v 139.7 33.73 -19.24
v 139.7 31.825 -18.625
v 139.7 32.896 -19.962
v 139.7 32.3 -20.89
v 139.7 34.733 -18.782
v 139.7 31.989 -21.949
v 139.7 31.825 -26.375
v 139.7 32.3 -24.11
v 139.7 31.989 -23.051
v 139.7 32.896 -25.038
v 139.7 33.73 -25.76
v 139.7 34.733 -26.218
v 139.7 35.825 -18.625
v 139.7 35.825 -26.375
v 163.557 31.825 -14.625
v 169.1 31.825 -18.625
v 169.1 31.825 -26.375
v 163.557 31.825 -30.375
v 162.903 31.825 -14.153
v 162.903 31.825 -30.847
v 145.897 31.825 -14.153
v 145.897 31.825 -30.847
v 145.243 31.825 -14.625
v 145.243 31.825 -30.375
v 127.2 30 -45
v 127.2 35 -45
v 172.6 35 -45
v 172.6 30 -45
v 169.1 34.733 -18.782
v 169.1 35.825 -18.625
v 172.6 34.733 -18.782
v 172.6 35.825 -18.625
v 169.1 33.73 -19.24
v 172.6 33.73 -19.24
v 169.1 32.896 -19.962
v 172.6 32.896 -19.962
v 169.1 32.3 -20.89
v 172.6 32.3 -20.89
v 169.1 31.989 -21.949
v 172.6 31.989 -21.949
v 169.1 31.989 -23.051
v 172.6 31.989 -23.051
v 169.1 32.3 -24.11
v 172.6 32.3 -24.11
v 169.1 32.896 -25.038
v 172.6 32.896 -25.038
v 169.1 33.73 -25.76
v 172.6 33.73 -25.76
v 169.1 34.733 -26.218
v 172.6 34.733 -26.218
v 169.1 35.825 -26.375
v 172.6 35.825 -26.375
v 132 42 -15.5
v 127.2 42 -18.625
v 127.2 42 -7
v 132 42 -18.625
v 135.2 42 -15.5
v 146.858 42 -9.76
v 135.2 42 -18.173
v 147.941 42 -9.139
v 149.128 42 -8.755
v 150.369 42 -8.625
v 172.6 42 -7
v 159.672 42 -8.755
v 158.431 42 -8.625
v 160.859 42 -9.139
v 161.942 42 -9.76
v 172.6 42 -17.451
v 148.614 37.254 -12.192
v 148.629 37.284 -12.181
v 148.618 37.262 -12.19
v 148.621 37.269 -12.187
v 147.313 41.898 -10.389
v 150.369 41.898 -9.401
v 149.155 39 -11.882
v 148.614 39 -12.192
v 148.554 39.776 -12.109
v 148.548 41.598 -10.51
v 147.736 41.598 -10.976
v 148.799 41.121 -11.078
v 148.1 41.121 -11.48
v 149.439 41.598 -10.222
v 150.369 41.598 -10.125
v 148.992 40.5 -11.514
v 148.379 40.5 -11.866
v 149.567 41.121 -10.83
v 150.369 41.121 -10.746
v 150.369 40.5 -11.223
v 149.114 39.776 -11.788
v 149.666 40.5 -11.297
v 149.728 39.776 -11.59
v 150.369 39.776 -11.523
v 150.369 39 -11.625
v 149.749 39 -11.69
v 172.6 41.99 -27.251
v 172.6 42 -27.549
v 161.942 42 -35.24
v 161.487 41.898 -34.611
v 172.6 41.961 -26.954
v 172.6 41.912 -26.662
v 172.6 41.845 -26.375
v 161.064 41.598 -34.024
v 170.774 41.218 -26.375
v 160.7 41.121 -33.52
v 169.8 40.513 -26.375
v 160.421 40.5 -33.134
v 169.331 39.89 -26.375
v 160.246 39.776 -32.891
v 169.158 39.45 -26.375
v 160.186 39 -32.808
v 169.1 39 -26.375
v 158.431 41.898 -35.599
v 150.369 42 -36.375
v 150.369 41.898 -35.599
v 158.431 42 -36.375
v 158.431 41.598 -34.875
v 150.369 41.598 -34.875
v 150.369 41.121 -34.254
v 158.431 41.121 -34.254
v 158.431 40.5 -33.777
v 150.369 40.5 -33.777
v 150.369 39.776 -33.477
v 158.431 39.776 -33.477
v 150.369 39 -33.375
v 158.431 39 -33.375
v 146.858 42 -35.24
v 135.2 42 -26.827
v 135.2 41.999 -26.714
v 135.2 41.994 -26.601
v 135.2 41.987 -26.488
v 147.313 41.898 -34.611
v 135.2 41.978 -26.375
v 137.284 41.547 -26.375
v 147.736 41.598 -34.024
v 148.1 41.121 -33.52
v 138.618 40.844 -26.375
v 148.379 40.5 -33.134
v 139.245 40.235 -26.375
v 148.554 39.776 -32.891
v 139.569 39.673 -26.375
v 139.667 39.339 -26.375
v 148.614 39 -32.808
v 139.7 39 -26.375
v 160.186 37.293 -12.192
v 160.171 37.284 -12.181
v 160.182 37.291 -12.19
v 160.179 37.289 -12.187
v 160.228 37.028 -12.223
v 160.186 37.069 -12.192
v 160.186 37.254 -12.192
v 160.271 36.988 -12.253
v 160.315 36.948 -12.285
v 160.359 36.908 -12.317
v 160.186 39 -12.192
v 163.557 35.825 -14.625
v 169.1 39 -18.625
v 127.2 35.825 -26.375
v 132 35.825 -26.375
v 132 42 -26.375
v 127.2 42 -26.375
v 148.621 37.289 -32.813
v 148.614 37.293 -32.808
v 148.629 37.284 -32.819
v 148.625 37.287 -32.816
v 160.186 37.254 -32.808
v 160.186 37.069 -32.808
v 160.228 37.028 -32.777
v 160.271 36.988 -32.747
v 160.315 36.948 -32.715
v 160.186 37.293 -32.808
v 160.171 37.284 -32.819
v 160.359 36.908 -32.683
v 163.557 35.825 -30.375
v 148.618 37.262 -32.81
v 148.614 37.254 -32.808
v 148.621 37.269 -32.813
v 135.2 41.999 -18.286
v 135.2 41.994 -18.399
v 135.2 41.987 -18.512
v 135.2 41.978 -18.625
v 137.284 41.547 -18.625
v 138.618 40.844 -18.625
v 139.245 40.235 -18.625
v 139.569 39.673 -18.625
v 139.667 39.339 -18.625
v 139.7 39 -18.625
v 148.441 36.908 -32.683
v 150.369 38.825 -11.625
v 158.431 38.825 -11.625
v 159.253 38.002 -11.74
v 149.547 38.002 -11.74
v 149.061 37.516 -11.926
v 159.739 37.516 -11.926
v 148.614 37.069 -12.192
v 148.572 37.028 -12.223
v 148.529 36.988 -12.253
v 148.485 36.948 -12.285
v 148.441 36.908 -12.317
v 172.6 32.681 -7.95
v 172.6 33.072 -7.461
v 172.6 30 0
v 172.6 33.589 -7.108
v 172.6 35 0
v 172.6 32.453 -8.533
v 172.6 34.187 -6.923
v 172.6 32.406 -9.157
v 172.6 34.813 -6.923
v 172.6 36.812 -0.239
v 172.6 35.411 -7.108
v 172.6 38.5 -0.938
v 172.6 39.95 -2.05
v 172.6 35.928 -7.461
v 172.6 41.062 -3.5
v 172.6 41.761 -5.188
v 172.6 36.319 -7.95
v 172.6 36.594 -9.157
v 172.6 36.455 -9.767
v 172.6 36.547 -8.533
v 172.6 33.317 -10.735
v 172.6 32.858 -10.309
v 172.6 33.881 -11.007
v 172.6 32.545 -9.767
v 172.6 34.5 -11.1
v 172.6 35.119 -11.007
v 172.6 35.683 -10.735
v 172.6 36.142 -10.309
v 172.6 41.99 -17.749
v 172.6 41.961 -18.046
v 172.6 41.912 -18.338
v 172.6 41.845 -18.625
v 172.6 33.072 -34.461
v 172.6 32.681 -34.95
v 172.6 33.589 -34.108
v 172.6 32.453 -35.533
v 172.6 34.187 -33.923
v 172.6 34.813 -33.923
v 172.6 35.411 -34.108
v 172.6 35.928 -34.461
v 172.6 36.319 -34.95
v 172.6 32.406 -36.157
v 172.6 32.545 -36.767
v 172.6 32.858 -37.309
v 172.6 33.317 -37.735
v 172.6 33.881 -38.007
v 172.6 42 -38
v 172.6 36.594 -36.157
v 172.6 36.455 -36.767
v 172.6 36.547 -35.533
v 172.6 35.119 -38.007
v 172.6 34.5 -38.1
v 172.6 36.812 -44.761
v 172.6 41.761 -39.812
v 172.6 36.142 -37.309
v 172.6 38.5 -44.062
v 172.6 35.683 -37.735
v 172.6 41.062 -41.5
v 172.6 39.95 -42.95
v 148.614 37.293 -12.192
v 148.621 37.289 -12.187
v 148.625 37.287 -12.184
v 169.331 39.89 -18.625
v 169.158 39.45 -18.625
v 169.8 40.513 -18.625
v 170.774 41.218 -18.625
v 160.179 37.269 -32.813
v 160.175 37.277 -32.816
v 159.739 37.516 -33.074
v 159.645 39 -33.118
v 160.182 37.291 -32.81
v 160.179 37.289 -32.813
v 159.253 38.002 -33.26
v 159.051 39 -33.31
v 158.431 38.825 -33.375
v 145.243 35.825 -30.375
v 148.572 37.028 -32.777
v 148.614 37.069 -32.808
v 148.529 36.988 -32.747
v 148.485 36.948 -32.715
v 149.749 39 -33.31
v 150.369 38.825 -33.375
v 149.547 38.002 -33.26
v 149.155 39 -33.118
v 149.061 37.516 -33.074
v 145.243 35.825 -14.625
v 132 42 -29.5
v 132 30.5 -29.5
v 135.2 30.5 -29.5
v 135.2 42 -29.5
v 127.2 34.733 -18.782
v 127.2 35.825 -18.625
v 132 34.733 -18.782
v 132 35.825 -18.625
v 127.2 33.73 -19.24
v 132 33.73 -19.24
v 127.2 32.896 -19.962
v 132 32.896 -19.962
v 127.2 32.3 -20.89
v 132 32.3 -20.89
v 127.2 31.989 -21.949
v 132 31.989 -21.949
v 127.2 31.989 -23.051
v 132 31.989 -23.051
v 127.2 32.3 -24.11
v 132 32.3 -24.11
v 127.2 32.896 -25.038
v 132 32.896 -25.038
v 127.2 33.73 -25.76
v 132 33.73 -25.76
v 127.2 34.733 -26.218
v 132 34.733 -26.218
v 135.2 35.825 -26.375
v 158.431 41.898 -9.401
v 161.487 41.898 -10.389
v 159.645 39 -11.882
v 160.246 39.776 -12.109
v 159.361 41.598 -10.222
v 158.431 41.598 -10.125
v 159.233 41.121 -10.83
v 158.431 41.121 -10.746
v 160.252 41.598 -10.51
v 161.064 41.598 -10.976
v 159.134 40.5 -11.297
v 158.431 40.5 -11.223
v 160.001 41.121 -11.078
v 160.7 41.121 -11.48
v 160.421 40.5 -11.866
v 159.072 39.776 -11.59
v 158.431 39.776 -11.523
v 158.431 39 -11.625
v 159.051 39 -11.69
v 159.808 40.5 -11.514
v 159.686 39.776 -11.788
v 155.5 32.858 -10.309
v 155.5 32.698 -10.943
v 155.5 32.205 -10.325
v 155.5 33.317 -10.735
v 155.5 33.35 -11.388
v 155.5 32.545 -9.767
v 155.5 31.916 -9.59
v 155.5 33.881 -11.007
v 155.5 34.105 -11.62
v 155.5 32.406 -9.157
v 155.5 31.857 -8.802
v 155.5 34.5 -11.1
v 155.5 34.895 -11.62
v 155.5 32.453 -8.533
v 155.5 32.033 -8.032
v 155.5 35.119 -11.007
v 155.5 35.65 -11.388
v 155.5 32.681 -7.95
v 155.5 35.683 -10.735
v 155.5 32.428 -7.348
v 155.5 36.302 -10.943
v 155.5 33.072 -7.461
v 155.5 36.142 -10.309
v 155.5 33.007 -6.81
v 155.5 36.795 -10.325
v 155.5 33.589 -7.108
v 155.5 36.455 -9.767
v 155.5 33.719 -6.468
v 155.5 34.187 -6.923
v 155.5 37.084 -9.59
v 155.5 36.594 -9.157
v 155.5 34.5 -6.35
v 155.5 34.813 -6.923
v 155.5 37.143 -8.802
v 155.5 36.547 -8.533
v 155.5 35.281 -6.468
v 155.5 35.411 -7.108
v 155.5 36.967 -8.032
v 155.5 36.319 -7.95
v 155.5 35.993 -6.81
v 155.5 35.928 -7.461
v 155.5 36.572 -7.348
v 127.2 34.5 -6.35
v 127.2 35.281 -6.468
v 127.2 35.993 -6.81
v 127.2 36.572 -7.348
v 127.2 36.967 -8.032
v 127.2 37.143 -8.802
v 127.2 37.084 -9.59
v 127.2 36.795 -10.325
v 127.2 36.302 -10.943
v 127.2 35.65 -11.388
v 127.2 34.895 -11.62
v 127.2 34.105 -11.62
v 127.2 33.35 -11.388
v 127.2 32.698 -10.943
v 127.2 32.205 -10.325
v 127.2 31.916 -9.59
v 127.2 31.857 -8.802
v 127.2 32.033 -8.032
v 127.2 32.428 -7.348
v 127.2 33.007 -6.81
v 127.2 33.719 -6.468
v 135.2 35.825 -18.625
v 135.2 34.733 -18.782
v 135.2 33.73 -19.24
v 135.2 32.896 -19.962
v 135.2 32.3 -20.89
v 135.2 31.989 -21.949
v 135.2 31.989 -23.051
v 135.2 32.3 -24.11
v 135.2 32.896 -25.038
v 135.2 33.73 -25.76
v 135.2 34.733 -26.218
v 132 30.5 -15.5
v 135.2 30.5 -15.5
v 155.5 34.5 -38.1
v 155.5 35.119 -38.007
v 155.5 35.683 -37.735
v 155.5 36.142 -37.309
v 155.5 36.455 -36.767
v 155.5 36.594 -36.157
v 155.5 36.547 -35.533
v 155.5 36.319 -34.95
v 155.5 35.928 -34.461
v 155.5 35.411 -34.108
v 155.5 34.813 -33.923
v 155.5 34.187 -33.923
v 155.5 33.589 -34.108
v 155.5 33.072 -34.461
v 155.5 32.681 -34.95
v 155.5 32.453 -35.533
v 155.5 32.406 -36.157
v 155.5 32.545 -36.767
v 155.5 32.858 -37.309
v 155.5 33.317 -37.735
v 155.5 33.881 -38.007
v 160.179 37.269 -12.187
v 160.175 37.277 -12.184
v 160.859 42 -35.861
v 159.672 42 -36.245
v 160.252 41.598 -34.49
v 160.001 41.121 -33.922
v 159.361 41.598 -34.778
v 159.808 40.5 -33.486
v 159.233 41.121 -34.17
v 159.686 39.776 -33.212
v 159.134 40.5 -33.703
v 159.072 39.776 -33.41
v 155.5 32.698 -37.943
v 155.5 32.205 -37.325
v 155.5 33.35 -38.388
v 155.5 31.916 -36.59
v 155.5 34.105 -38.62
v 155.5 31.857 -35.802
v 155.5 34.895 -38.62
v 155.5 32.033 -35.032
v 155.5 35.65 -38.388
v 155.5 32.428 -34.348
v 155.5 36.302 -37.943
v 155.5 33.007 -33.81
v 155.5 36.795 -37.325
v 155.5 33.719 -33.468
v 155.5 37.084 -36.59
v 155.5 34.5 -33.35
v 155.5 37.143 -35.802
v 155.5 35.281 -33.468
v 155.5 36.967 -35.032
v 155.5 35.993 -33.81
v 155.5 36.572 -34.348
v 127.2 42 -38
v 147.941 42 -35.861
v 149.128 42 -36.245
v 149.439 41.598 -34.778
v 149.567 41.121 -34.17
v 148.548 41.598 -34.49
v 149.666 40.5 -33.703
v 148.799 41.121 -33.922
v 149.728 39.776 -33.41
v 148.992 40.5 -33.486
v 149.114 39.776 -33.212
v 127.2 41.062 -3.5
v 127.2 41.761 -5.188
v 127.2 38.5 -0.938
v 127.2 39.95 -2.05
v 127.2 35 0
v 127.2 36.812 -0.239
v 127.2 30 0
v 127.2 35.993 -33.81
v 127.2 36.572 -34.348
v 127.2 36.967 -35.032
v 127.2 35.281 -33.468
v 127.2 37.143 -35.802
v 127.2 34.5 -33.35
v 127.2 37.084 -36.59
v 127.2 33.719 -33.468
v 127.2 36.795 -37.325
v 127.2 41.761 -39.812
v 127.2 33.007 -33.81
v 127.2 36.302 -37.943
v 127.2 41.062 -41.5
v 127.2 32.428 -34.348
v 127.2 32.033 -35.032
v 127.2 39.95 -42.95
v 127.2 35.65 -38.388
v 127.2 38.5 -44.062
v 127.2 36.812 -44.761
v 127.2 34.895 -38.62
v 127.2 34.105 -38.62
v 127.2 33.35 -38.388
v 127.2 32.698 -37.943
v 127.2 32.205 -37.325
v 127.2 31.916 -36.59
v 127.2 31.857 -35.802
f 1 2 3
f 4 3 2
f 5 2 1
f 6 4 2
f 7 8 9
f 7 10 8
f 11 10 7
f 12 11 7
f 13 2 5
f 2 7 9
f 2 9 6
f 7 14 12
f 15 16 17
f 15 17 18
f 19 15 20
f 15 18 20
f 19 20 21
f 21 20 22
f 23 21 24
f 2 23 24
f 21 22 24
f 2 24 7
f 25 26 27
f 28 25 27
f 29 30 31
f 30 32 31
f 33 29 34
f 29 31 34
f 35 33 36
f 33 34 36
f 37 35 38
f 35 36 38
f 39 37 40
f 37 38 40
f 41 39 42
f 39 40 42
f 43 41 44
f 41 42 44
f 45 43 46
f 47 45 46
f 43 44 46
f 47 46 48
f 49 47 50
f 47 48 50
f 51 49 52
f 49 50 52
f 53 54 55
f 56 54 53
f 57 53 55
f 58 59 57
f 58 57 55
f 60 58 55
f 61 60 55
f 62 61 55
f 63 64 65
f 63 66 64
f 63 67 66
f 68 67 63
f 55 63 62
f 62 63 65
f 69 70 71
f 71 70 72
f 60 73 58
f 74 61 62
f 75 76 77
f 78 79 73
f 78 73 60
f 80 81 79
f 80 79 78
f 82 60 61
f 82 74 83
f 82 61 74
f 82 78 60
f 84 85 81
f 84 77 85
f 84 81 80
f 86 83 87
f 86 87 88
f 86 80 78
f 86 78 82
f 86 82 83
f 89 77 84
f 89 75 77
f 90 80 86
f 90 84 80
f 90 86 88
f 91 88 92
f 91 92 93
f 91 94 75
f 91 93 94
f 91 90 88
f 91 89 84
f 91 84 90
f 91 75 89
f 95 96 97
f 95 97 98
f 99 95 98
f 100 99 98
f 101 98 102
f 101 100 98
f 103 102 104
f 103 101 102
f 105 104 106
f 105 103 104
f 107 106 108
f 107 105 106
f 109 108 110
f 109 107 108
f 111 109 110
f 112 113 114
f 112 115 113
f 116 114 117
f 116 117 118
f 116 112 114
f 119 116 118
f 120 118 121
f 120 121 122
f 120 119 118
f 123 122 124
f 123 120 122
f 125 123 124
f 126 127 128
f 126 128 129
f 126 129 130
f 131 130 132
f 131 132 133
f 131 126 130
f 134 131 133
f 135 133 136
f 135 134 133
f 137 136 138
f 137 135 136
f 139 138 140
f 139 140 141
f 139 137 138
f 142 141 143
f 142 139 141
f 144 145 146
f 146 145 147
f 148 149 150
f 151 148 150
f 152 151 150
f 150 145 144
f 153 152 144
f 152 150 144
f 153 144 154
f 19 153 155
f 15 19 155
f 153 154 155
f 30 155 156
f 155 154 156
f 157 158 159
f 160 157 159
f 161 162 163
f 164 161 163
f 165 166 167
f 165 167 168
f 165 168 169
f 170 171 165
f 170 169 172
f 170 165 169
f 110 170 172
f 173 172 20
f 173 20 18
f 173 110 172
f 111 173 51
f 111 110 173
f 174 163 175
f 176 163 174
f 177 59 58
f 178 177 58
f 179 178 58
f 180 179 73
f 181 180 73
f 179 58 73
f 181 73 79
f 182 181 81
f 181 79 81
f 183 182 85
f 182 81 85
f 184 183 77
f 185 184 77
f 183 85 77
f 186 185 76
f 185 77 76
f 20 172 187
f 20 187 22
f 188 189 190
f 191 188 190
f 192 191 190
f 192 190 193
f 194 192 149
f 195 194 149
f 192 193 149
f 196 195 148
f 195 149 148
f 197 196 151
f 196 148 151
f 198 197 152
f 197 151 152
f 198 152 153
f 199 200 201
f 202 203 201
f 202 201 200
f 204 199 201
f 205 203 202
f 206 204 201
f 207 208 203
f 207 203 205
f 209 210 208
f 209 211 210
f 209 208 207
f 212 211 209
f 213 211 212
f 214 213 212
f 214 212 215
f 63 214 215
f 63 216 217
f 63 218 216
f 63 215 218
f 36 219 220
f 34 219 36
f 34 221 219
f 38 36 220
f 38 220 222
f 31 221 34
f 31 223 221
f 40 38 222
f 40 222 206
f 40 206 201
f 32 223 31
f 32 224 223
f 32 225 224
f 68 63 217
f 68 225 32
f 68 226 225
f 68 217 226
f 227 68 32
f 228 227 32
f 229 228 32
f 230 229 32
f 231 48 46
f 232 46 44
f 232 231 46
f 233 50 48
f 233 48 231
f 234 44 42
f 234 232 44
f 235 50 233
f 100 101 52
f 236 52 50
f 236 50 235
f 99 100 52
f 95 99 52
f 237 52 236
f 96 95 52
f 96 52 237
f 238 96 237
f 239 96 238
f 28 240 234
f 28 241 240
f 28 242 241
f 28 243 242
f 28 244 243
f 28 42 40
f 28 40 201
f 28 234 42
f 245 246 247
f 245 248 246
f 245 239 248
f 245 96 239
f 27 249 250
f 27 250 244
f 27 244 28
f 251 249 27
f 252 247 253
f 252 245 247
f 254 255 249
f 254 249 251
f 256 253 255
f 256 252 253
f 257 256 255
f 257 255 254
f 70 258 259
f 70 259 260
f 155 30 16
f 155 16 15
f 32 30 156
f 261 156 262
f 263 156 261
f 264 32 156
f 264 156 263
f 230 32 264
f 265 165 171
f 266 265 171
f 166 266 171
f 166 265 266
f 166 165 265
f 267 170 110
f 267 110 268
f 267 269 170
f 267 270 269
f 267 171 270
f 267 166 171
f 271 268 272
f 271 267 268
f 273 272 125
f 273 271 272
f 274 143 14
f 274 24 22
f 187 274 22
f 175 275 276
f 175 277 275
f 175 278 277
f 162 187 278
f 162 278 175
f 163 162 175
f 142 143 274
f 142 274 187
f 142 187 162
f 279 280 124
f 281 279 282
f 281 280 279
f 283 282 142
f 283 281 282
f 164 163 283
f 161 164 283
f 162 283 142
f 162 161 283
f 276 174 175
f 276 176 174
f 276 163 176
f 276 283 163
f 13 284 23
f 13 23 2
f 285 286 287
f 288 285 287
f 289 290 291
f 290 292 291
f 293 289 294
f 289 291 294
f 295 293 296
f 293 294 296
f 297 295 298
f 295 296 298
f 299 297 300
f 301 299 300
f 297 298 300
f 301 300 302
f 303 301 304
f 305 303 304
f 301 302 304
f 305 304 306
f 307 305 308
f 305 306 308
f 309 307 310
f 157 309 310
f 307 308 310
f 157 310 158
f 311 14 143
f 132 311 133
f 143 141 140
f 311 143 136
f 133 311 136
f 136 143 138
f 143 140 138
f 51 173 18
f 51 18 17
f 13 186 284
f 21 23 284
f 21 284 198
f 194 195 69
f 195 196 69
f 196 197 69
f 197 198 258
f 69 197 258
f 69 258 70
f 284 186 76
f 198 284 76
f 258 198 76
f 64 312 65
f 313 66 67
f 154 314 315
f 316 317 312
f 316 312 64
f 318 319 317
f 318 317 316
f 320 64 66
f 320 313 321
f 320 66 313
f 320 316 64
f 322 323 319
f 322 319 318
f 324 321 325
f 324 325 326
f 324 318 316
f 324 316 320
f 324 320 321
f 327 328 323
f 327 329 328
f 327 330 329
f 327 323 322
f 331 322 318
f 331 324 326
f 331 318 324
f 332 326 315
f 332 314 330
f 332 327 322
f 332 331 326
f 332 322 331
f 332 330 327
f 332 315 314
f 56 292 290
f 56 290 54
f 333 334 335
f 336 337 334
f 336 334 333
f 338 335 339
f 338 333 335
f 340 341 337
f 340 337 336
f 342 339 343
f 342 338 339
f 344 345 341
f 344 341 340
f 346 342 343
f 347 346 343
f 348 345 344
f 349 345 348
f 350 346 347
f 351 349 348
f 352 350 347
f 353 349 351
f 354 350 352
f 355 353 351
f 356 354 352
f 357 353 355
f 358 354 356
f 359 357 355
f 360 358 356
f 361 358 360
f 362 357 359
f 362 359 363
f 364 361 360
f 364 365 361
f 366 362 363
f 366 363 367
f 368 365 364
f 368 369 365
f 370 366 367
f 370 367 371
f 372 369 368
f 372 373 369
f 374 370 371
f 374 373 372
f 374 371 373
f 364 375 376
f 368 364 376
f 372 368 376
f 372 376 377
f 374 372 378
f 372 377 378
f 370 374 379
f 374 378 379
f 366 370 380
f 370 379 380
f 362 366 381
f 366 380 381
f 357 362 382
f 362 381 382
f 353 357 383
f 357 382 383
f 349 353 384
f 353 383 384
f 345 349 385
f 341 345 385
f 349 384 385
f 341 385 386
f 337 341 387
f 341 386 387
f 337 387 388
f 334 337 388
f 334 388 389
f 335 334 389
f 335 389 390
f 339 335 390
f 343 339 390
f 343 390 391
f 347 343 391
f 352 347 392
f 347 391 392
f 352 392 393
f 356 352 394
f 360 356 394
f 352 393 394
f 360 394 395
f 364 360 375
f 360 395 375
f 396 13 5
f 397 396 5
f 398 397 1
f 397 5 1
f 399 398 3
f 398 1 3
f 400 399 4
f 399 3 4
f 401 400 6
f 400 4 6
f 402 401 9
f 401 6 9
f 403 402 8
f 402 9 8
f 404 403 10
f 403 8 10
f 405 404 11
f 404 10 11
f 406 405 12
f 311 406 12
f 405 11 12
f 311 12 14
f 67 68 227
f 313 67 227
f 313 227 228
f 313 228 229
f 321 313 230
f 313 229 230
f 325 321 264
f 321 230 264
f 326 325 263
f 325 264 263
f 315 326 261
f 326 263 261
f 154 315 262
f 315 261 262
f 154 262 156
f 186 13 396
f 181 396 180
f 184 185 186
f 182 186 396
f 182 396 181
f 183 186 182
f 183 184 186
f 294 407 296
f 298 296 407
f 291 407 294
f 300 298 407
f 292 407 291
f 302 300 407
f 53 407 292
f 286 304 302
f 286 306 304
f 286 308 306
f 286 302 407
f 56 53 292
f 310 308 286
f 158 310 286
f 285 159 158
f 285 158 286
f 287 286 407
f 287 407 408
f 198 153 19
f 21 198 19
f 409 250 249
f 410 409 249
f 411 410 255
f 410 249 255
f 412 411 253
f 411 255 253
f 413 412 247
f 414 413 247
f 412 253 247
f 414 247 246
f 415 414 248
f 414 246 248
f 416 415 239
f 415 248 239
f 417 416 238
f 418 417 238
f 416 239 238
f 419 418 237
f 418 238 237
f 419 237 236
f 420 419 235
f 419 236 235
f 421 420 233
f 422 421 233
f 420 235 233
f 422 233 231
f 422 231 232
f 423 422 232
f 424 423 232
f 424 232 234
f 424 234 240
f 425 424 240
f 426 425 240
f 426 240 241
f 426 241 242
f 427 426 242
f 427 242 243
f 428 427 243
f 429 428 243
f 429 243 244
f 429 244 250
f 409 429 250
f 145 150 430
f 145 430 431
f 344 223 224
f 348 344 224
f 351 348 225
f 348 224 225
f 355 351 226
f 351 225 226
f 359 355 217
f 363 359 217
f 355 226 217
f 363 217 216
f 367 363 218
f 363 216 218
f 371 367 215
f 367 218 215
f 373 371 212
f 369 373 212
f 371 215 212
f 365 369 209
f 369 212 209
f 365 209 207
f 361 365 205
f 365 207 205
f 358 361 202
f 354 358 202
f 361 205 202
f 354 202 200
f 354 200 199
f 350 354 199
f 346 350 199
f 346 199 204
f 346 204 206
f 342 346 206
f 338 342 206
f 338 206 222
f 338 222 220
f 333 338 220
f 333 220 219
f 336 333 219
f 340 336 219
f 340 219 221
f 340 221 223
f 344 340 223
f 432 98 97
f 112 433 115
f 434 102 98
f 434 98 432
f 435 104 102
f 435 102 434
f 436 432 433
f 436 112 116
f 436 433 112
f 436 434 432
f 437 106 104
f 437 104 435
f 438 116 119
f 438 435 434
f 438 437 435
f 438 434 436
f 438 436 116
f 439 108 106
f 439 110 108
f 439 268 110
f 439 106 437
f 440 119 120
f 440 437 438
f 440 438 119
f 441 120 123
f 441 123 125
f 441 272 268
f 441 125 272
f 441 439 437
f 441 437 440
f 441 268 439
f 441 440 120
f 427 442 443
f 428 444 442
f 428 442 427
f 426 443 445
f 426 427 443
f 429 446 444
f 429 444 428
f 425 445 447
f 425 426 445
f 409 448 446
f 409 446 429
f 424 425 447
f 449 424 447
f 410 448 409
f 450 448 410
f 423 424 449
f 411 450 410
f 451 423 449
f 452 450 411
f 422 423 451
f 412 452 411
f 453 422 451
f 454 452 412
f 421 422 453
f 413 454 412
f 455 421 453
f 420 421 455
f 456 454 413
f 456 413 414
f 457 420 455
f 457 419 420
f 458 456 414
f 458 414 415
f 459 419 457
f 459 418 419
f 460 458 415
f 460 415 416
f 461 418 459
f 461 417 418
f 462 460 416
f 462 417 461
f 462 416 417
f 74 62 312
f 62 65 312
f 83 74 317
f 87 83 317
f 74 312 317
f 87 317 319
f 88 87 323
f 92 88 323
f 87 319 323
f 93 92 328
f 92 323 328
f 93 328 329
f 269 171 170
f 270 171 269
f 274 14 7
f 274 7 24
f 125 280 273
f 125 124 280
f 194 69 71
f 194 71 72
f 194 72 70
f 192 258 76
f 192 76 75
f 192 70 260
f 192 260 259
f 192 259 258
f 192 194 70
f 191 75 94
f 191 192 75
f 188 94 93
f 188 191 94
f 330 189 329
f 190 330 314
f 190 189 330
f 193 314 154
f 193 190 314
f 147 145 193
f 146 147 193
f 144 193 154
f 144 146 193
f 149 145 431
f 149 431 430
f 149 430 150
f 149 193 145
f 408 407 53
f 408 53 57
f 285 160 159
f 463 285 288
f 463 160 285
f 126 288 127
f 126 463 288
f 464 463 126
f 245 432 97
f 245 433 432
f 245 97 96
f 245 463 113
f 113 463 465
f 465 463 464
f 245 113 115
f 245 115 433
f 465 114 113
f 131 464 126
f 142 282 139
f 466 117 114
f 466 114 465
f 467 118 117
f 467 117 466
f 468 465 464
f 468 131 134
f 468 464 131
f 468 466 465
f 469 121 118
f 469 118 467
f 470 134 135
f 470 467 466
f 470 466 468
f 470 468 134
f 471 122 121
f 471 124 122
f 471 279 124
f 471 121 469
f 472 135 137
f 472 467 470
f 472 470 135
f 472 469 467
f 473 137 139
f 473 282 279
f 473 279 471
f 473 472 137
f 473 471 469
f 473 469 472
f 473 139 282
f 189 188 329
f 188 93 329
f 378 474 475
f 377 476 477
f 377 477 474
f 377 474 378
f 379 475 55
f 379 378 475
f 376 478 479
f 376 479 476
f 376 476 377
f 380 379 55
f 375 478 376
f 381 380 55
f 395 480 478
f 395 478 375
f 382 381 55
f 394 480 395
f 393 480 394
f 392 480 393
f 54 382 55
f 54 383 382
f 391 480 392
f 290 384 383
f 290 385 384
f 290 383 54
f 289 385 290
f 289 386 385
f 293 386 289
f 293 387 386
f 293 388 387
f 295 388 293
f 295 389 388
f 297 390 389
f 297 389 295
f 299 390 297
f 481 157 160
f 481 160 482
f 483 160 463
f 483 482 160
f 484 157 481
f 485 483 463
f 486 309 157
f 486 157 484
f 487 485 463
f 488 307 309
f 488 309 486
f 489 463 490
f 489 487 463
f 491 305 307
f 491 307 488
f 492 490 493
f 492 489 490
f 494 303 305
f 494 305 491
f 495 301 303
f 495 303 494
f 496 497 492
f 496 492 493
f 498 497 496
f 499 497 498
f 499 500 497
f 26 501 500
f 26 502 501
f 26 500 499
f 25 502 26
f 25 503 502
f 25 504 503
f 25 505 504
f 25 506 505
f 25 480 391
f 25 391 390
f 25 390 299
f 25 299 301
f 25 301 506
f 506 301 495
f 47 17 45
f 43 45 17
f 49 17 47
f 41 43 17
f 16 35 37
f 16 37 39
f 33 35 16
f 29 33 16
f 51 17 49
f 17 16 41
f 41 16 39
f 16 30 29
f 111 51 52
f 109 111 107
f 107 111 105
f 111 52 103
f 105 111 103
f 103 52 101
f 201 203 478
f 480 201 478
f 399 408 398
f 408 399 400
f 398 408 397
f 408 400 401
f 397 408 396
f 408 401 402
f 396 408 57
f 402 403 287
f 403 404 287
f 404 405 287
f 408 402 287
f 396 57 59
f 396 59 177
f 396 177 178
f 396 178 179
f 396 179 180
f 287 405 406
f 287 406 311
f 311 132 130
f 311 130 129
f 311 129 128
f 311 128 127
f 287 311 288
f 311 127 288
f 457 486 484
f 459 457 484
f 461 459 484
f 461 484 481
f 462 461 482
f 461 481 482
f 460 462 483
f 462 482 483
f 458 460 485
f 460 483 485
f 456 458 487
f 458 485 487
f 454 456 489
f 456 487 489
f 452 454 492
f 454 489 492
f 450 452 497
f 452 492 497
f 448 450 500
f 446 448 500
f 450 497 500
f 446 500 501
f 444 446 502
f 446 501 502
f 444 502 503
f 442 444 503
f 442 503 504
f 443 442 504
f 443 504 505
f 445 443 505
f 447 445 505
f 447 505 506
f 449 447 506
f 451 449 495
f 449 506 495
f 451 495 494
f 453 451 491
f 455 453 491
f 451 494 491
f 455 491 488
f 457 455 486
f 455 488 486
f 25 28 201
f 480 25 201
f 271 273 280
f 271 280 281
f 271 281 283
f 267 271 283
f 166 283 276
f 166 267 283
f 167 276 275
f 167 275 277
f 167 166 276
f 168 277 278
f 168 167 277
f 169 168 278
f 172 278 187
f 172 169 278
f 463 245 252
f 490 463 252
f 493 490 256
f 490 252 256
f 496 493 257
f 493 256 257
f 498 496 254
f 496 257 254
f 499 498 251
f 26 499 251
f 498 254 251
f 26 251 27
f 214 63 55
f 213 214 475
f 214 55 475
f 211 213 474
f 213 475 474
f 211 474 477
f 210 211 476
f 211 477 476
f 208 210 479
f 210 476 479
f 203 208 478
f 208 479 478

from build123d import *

# Parameters (mm, degrees)
SKETCH1_W                = 218
SKETCH1_H                = 45
BOSS_EXTRUDE1_DEPTH      = 42
SKETCH7_W                = 118.2
SKETCH7_H                = 42
CUT_EXTRUDE17_DEPTH      = 21
SKETCH4_W                = 7.75
SKETCH4_H                = 6.175
CUT_EXTRUDE14_DEPTH      = 97.8
SKETCH5_R                = 3.875
CUT_EXTRUDE15_DEPTH      = 97.8
SKETCH11_W               = 3.2
SKETCH11_H               = 14
CUT_EXTRUDE19_DEPTH      = 11.5
CUT_EXTRUDE43_DEPTH      = 7
SKETCH53_R               = 2.1
CUT_EXTRUDE44_DEPTH      = 95
SKETCH68_R               = 2.65
CUT_EXTRUDE57_DEPTH      = 28.3
BOSS_EXTRUDE2_DEPTH      = 5
SKETCH42_W               = 80.5
SKETCH42_H               = 9.5
BOSS_EXTRUDE3_DEPTH      = 35
SKETCH38_R               = 3.1
CUT_EXTRUDE32_DEPTH      = 4.7
SKETCH40_R               = 5.5
CUT_EXTRUDE34_DEPTH      = 9
SKETCH41_R               = 5.75
CUT_EXTRUDE35_DEPTH      = 4
FILLET1_R                = 7
FILLET7_R                = 5
SKETCH47_R               = 1.5
CUT_EXTRUDE39_DEPTH      = 7
SKETCH49_R               = 2.8
CUT_EXTRUDE41_DEPTH      = 33
SKETCH56_W               = 15.8
SKETCH56_H               = 10.4
CUT_EXTRUDE47_DEPTH      = 32.15
SKETCH57_W               = 5
SKETCH57_H               = 10.4
CUT_EXTRUDE48_DEPTH      = 15
SKETCH58_R               = 2.8
SKETCH58_R_2             = 2.05
CUT_EXTRUDE49_DEPTH      = 10
SKETCH59_R               = 1.5
SKETCH59_R_2             = 0.95
CUT_EXTRUDE50_DEPTH      = 6.5
CUT_EXTRUDE51_START      = -9
CUT_EXTRUDE51_DEPTH      = 9
CUT_EXTRUDE52_DEPTH      = 118.2
SKETCH64_R               = 1.5
CUT_EXTRUDE53_DEPTH      = 14
SKETCH65_R               = 2.8
CUT_EXTRUDE54_DEPTH      = 9.95
SKETCH66_R               = 1.5
CUT_EXTRUDE55_DEPTH      = 25
SKETCH67_R               = 1.45
CUT_EXTRUDE56_DEPTH      = 7
CUT_EXTRUDE58_START      = -4
SKETCH69_R               = 2.8
CUT_EXTRUDE58_DEPTH      = 41
CUT_EXTRUDE59_DEPTH      = 6.175
FILLET17_R               = 3
CUT_EXTRUDE64_DEPTH      = 4
FILLET19_R               = 3
CUT_EXTRUDE65_DEPTH      = 4
CUT_EXTRUDE61_DEPTH      = 1
CUT_EXTRUDE61_DEPTH_BACK = 221.034656475
SKETCH72_W               = 64
SKETCH72_H               = 35
SKETCH74_W               = 118.2
SKETCH74_H               = 64
CUT_EXTRUDE62_DEPTH      = 226.02944262
SKETCH81_W               = 45.4
SKETCH81_H               = 45
CUT_EXTRUDE66_DEPTH      = 12


with BuildPart() as part:
    # Sketch1 → Boss-Extrude1 (new body)
    with BuildSketch(Plane(origin=(0, 0, 0), x_dir=(1, 0, 0), z_dir=(0, 1, 0))):
        with Locations((109, 22.5)):
            Rectangle(SKETCH1_W, SKETCH1_H)
    extrude(amount=BOSS_EXTRUDE1_DEPTH)

    # Sketch7 → Cut-Extrude17 (cut)
    with BuildSketch(Plane(origin=(0, 42, 0), x_dir=(1, 0, 0), z_dir=(0, 1, 0))):
        with Locations((68.1, 22.5)):
            Rectangle(SKETCH7_W, SKETCH7_H)
    extrude(amount=-CUT_EXTRUDE17_DEPTH, mode=Mode.SUBTRACT)

    # Sketch4 → Cut-Extrude14 (cut)
    with BuildSketch(Plane(origin=(218, 0, 0), x_dir=(0, 0, -1), z_dir=(1, 0, 0))):
        with Locations((22.5, 38.9125)):
            Rectangle(SKETCH4_W, SKETCH4_H)
    extrude(amount=-CUT_EXTRUDE14_DEPTH, mode=Mode.SUBTRACT)

    # Sketch5 → Cut-Extrude15 (cut)
    with BuildSketch(Plane(origin=(218, 0, 0), x_dir=(0, 0, -1), z_dir=(1, 0, 0))):
        with Locations((22.5, 35.825)):
            Circle(SKETCH5_R)
    extrude(amount=-CUT_EXTRUDE15_DEPTH, mode=Mode.SUBTRACT)

    # Sketch11 → Cut-Extrude19 (cut)
    with BuildSketch(Plane(origin=(0, 42, 0), x_dir=(1, 0, 0), z_dir=(0, 1, 0))):
        with Locations((133.6, 22.5)):
            Rectangle(SKETCH11_W, SKETCH11_H)
    extrude(amount=-CUT_EXTRUDE19_DEPTH, mode=Mode.SUBTRACT)

    # Sketch52 → Cut-Extrude43 (cut)
    with BuildSketch(Plane(origin=(218, 0, 0), x_dir=(0, 0, -1), z_dir=(1, 0, 0))):
        with BuildLine():
            Line((17.475, 42), (17.475, 35.825))
            ThreePointArc((17.475, 35.825), (22.5, 30.8), (27.525, 35.825))
            Line((27.525, 35.825), (27.525, 42))
            Line((27.525, 42), (17.475, 42))
        make_face()
    extrude(amount=-CUT_EXTRUDE43_DEPTH, mode=Mode.SUBTRACT)

    # Sketch53 → Cut-Extrude44 (cut)
    with BuildSketch(Plane(origin=(218, 0, 0), x_dir=(0, 0, -1), z_dir=(1, 0, 0))):
        with Locations((9, 34.5)):
            Circle(SKETCH53_R)
        with Locations((36, 34.5)):
            Circle(SKETCH53_R)
    extrude(amount=-CUT_EXTRUDE44_DEPTH, mode=Mode.SUBTRACT)

    # Sketch68 → Cut-Extrude57 (cut)
    with BuildSketch(Plane.ZY.offset(-127.2)):
        with Locations((-9, 34.5)):
            Circle(SKETCH68_R)
        with Locations((-36, 34.5)):
            Circle(SKETCH68_R)
    extrude(amount=-CUT_EXTRUDE57_DEPTH, mode=Mode.SUBTRACT)

    # Sketch14 → Boss-Extrude2 (add)
    with BuildSketch(Plane.XZ):
        Polygon((9, -54.5), (89.5, -54.5), (89.5, -45), (218, -45), (218, 0), (89.5, 0), (89.5, 9.5), (9, 9.5), (9, 0), (0, 0), (0, -45), (9, -45), align=None)
    extrude(amount=BOSS_EXTRUDE2_DEPTH)

    # Sketch42 → Boss-Extrude3 (add)
    with BuildSketch(Plane(origin=(0, 0, 0), x_dir=(1, 0, 0), z_dir=(0, 1, 0))):
        with Locations((49.25, -4.75)):
            Rectangle(SKETCH42_W, SKETCH42_H)
        with Locations((49.25, 49.75)):
            Rectangle(SKETCH42_W, SKETCH42_H)
    extrude(amount=BOSS_EXTRUDE3_DEPTH)

    # Sketch38 → Cut-Extrude32 (cut)
    with BuildSketch(Plane(origin=(127.2, -5, -22.5), x_dir=(0, 0, -1), z_dir=(0, -1, 0))):
        with Locations((23.5, -61.2)):
            Circle(SKETCH38_R)
        with Locations((10, -61.2)):
            Circle(SKETCH38_R)
    extrude(amount=-CUT_EXTRUDE32_DEPTH, mode=Mode.SUBTRACT)

    # Sketch40 → Cut-Extrude34 (cut)
    with BuildSketch(Plane(origin=(127.2, -5, -22.5), x_dir=(0, 0, -1), z_dir=(0, -1, 0))):
        with Locations((0, -33.7)):
            Circle(SKETCH40_R)
    extrude(amount=-CUT_EXTRUDE34_DEPTH, mode=Mode.SUBTRACT)

    # Sketch41 → Cut-Extrude35 (cut)
    with BuildSketch(Plane(origin=(127.2, -5, -22.5), x_dir=(0, 0, -1), z_dir=(0, -1, 0))):
        with Locations((20, -73.2)):
            Circle(SKETCH41_R)
        with Locations((-20, -73.2)):
            Circle(SKETCH41_R)
    extrude(amount=-CUT_EXTRUDE35_DEPTH, mode=Mode.SUBTRACT)

    # Fillet1
    # the kernel refuses this fillet: 7 mm, written as the material it takes off along each edge
    with BuildSketch(Plane(origin=(235.5, 42, -45), x_dir=(0, 0, 1), z_dir=(-1, 0, 0))) as fillet1_piece_1:
        with BuildLine():
            CenterArc((FILLET1_R, -FILLET1_R), FILLET1_R, 90, 90)
            Line((0, -FILLET1_R), (0, 0))
            Line((0, 0), (FILLET1_R, 0))
        make_face()
    extrude(amount=253, mode=Mode.SUBTRACT)
    with BuildSketch(Plane(origin=(-17.5, 42, 0), x_dir=(0, -1, 0), z_dir=(1, 0, 0))) as fillet1_piece_2:
        with BuildLine():
            CenterArc((FILLET1_R, FILLET1_R), FILLET1_R, 180, 90)
            Line((0, FILLET1_R), (0, 0))
            Line((0, 0), (FILLET1_R, 0))
        make_face()
    extrude(amount=253, mode=Mode.SUBTRACT)

    # Fillet7
    fillet7_edges = [part.edges().sort_by_distance(p)[0] for p in [
        (49.25, 35, -54.5),
        (49.25, 35, 9.5),
    ]]
    fillet(fillet7_edges, radius=FILLET7_R)

    # Sketch47 → Cut-Extrude39 (cut)
    with BuildSketch(Plane(origin=(127.2, -0.3, -22.5), x_dir=(0, 0, -1), z_dir=(0, -1, 0))):
        with Locations((23.5, -61.2)):
            Circle(SKETCH47_R)
        with Locations((10, -61.2)):
            Circle(SKETCH47_R)
    extrude(amount=-CUT_EXTRUDE39_DEPTH, mode=Mode.SUBTRACT)

    # Sketch49 → Cut-Extrude41 (cut)
    with BuildSketch(Plane.XZ.offset(-6.7)):
        with Locations(Location((66, -32.5, 0), (0, 0, 270))):
            Circle(SKETCH49_R)
        with Locations(Location((66, -46, 0), (0, 0, 270))):
            Circle(SKETCH49_R)
    extrude(amount=-CUT_EXTRUDE41_DEPTH, mode=Mode.SUBTRACT)

    # Sketch56 → Cut-Extrude47 (cut)
    with BuildSketch(Plane.XZ.offset(5)):
        with Locations((135.1, -14.2)):
            Rectangle(SKETCH56_W, SKETCH56_H)
    extrude(amount=-CUT_EXTRUDE47_DEPTH, mode=Mode.SUBTRACT)

    # Sketch57 → Cut-Extrude48 (cut)
    with BuildSketch(Plane.XZ.offset(5)):
        with Locations((124.7, -14.2)):
            Rectangle(SKETCH57_W, SKETCH57_H)
    extrude(amount=-CUT_EXTRUDE48_DEPTH, mode=Mode.SUBTRACT)

    # Sketch58 → Cut-Extrude49 (cut)
    with BuildSketch(Plane(origin=(127.2, 21, 0), x_dir=(0, -1, 0), z_dir=(0, 0, 1))):
        with Locations(Location((19.05, 2.8, 0), (0, 0, 90))):
            Circle(SKETCH58_R)
        with Locations(Location((10.15, 2.8, 0), (0, 0, 90))):
            Circle(SKETCH58_R_2)
        with BuildLine():
            Line((-2.632795978, 15.65), (-3.667204022, 15.65))
            ThreePointArc((-3.667204022, 15.65), (-5.85, 13), (-3.667204022, 10.35))
            Line((-3.667204022, 10.35), (-2.632795978, 10.35))
            ThreePointArc((-2.632795978, 10.35), (-0.45, 13), (-2.632795978, 15.65))
        make_face()
    extrude(amount=-CUT_EXTRUDE49_DEPTH, mode=Mode.SUBTRACT)

    # Sketch59 → Cut-Extrude50 (cut)
    with BuildSketch(Plane.XY.offset(-19.4)):
        with Locations((130, 1.95)):
            Circle(SKETCH59_R)
        with Locations((130, 10.85)):
            Circle(SKETCH59_R_2)
        with Locations((140.2, 24.15)):
            Circle(SKETCH59_R)
    extrude(amount=-CUT_EXTRUDE50_DEPTH, mode=Mode.SUBTRACT)

    # Sketch62 → Cut-Extrude51 (cut)
    with BuildSketch(Plane.ZY.offset(CUT_EXTRUDE51_START)):
        with BuildLine():
            Line((0, -5), (-45, -5))
            Line((-45, -5), (-45, 35))
            ThreePointArc((-45, 35), (-42.949747468, 39.949747468), (-38, 42))
            Line((-38, 42), (-7, 42))
            ThreePointArc((-7, 42), (-2.050252532, 39.949747468), (0, 35))
            Line((0, 35), (0, -5))
        make_face()
    extrude(amount=CUT_EXTRUDE51_DEPTH, mode=Mode.SUBTRACT)

    # Sketch63 → Cut-Extrude52 (cut)
    with BuildSketch(Plane(origin=(127.2, 21, -22.5), x_dir=(0, 0, -1), z_dir=(-1, 0, 0))):
        with BuildLine():
            Line((-10.959716831, -18.950283169), (11.040283169, -18.950283169))
            ThreePointArc((11.040283169, -18.950283169), (18.111350981, -16.021350981), (21.040283169, -8.950283169))
            Line((21.040283169, -8.950283169), (21.040283169, 2.049716831))
            ThreePointArc((21.040283169, 2.049716831), (18.111350981, 9.120784643), (11.040283169, 12.049716831))
            Line((11.040283169, 12.049716831), (-10.959716831, 12.049716831))
            ThreePointArc((-10.959716831, 12.049716831), (-18.030784643, 9.120784643), (-20.959716831, 2.049716831))
            Line((-20.959716831, 2.049716831), (-20.959716831, -8.950283169))
            ThreePointArc((-20.959716831, -8.950283169), (-18.030784643, -16.021350981), (-10.959716831, -18.950283169))
        make_face()
    extrude(amount=CUT_EXTRUDE52_DEPTH, mode=Mode.SUBTRACT)

    # Sketch64 → Cut-Extrude53 (cut)
    with BuildSketch(Plane(origin=(127.2, -5, -22.5), x_dir=(0, 0, -1), z_dir=(0, -1, 0))):
        with Locations((-1, -71.2)):
            Circle(SKETCH64_R)
    extrude(amount=-CUT_EXTRUDE53_DEPTH, mode=Mode.SUBTRACT)

    # Sketch65 → Cut-Extrude54 (cut)
    with BuildSketch(Plane(origin=(127.2, 8.950283169, -22.5), x_dir=(0, 0, 1), z_dir=(0, 1, 0))):
        with Locations((1, -71.2)):
            Circle(SKETCH65_R)
    extrude(amount=-CUT_EXTRUDE54_DEPTH, mode=Mode.SUBTRACT)

    # Sketch66 → Cut-Extrude55 (cut)
    with BuildSketch(Plane(origin=(127.2, -5, -22.5), x_dir=(0, 0, -1), z_dir=(0, -1, 0))):
        with Locations((-20, -52.2)):
            Circle(SKETCH66_R)
    extrude(amount=-CUT_EXTRUDE55_DEPTH, mode=Mode.SUBTRACT)

    # Sketch67 → Cut-Extrude56 (cut)
    with BuildSketch(Plane(origin=(9, 21, -22.5), x_dir=(0, 0, -1), z_dir=(-1, 0, 0))):
        with Locations(Location((27, -9, 0), (0, 0, 180))):
            Circle(SKETCH67_R)
        with Locations(Location((27, 21, 0), (0, 0, 180))):
            Circle(SKETCH67_R)
        with Locations(Location((-27, 21, 0), (0, 0, 180))):
            Circle(SKETCH67_R)
        with Locations(Location((-27, -9, 0), (0, 0, 180))):
            Circle(SKETCH67_R)
    extrude(amount=-CUT_EXTRUDE56_DEPTH, mode=Mode.SUBTRACT)

    # Sketch69 → Cut-Extrude58 (cut)
    with BuildSketch(Plane(origin=(127.2, -5, -22.5), x_dir=(0, 0, -1), z_dir=(0, -1, 0)).offset(CUT_EXTRUDE58_START)):
        with Locations((-20, -52.2)):
            Circle(SKETCH69_R)
    extrude(amount=-CUT_EXTRUDE58_DEPTH, mode=Mode.SUBTRACT)

    # Sketch70 → Cut-Extrude59 (cut)
    with BuildSketch(Plane(origin=(0, 42, 0), x_dir=(1, 0, 0), z_dir=(0, 1, 0))):
        Polygon((149.4, 33.375), (159.4, 33.375), (169.1, 26.375), (139.7, 26.375), align=None)
        Polygon((177.1, 26.375), (186.8, 33.375), (196.8, 33.375), (206.5, 26.375), align=None)
        Polygon((139.7, 18.625), (149.4, 11.625), (159.4, 11.625), (169.1, 18.625), align=None)
        Polygon((177.1, 18.625), (186.8, 11.625), (196.8, 11.625), (206.5, 18.625), align=None)
    extrude(amount=-CUT_EXTRUDE59_DEPTH, mode=Mode.SUBTRACT)

    # Fillet17
    fillet17_edges = [part.edges().sort_by_distance(p)[0] for p in [
        (154.4, 35.825, -11.625),
        (159.4, 38.9125, -11.625),
        (149.4, 38.9125, -11.625),
        (144.55, 42, -15.125),
        (154.4, 42, -11.625),
        (164.25, 42, -15.125),
        (154.4, 35.825, -33.375),
        (149.4, 38.9125, -33.375),
        (159.4, 38.9125, -33.375),
        (164.25, 42, -29.875),
        (154.4, 42, -33.375),
        (144.55, 42, -29.875),
    ]]
    fillet(fillet17_edges, radius=FILLET17_R)

    # Sketch78 → Cut-Extrude64 (cut)
    with BuildSketch(Plane(origin=(0, 35.825, 0), x_dir=(1, 0, 0), z_dir=(0, 1, 0))):
        Polygon((145.242857143, 30.375), (163.557142857, 30.375), (169.1, 26.375), (169.1, 18.625), (163.557142857, 14.625), (145.242857143, 14.625), (139.7, 18.625), (139.7, 26.375), align=None)
    extrude(amount=-CUT_EXTRUDE64_DEPTH, mode=Mode.SUBTRACT)

    # Fillet19
    # the kernel refuses this fillet: 3 mm, written as the material it adds along each edge
    with BuildSketch(Plane(origin=(186.8, 42, -11.625), x_dir=(-0.8108996116451952, 0, -0.5851852867542652), z_dir=(0, -1, 0)), Plane(origin=(196.8, 42, -11.625), x_dir=(-1, 0, 0), z_dir=(0, -1, 0))) as fillet19_piece_1:
        with BuildLine():
            CenterArc((FILLET19_R * 0.323146177177, FILLET19_R), FILLET19_R, 234.183919251, 35.816080749)
            Line((-FILLET19_R * 0.262039109577, FILLET19_R * 0.189100388355), (0, 0))
            Line((0, 0), (FILLET19_R * 0.323146177177, 0))
        make_face()
    extrude(amount=8.598596329)
    with BuildSketch(Plane(origin=(179.3, 35.825, -11.625), x_dir=(0, 1, 0), z_dir=(1, 0, 0))) as fillet19_piece_2:
        with BuildLine():
            CenterArc((FILLET19_R, -FILLET19_R), FILLET19_R, 90, 90)
            Line((0, -FILLET19_R), (0, 0))
            Line((0, 0), (FILLET19_R, 0))
        make_face()
    extrude(amount=25)
    with BuildSketch(Plane(origin=(196.8, 42, -33.375), x_dir=(-1, 0, 0), z_dir=(0, -1, 0)), Plane(origin=(186.8, 42, -33.375), x_dir=(-0.8108996116451974, 0, 0.5851852867542621), z_dir=(0, -1, 0))) as fillet19_piece_3:
        with BuildLine():
            CenterArc((FILLET19_R * 0.323146177177, -FILLET19_R), FILLET19_R, 90, 35.816080749)
            Line((-FILLET19_R * 0.262039109577, -FILLET19_R * 0.189100388355), (0, 0))
            Line((0, 0), (FILLET19_R * 0.323146177177, 0))
        make_face()
    extrude(amount=8.598596329)
    with BuildSketch(Plane(origin=(179.3, 35.825, -33.375), x_dir=(0, 1, 0), z_dir=(1, 0, 0))) as fillet19_piece_4:
        with BuildLine():
            CenterArc((FILLET19_R, FILLET19_R), FILLET19_R, 180, 90)
            Line((0, FILLET19_R), (0, 0))
            Line((0, 0), (FILLET19_R, 0))
        make_face()
    extrude(amount=25)
    # the kernel refuses this fillet: 3 mm, written as the material it takes off along each edge
    with BuildSketch(Plane(origin=(171.018252913, 42, -23.013889651), x_dir=(-0.5851852867542667, 0, 0.8108996116451942), z_dir=(0.8108996116451941, 0, 0.5851852867542667)), Plane(origin=(197.586117329, 42, -12.192301165), x_dir=(0.5851852867542677, 0, 0.8108996116451934), z_dir=(0.8108996116451934, 0, -0.5851852867542677))) as fillet19_2_piece_1:
        with BuildLine():
            CenterArc((FILLET19_R, FILLET19_R), FILLET19_R, 180, 90)
            Line((0, FILLET19_R), (0, 0))
            Line((0, 0), (FILLET19_R, 0))
        make_face()
    extrude(amount=18.492584709, mode=Mode.SUBTRACT)
    with BuildSketch(Plane(origin=(197.586117329, 42, -32.807698835), x_dir=(0.585185286754268, 0, -0.8108996116451932), z_dir=(0.8108996116451932, 0, 0.585185286754268)), Plane(origin=(171.018252913, 42, -21.986110349), x_dir=(-0.5851852867542668, 0, -0.810899611645194), z_dir=(0.8108996116451941, 0, -0.5851852867542668))) as fillet19_2_piece_2:
        with BuildLine():
            CenterArc((FILLET19_R, -FILLET19_R), FILLET19_R, 90, 90)
            Line((0, -FILLET19_R), (0, 0))
            Line((0, 0), (FILLET19_R, 0))
        make_face()
    extrude(amount=18.492584709, mode=Mode.SUBTRACT)
    with BuildSketch(Plane(origin=(187.769438532, 42, -11.625), x_dir=(0, 0, 1), z_dir=(1, 0, 0))) as fillet19_2_piece_3:
        with BuildLine():
            CenterArc((FILLET19_R, FILLET19_R), FILLET19_R, 180, 90)
            Line((0, FILLET19_R), (0, 0))
            Line((0, 0), (FILLET19_R, 0))
        make_face()
    extrude(amount=8.061122937, mode=Mode.SUBTRACT)
    with BuildSketch(Plane(origin=(187.769438532, 42, -33.375), x_dir=(0, 0, -1), z_dir=(1, 0, 0))) as fillet19_2_piece_4:
        with BuildLine():
            CenterArc((FILLET19_R, -FILLET19_R), FILLET19_R, 90, 90)
            Line((0, -FILLET19_R), (0, 0))
            Line((0, 0), (FILLET19_R, 0))
        make_face()
    extrude(amount=8.061122937, mode=Mode.SUBTRACT)
    with BuildSketch(Plane(origin=(187.769438532, 42, -30.375), x_dir=(-0.5851852867542677, 0, -0.8108996116451933), z_dir=(-0.8108996116451933, 0, 0.5851852867542677))) as fillet19_2_piece_5:
        with BuildLine():
            CenterArc((3 + FILLET19_R, FILLET19_R), FILLET19_R, 180, 90)
            Line((3, FILLET19_R), (3, 0))
            Line((3, 0), (3 + FILLET19_R, 0))
        make_face()
    revolve(axis=Axis((187.769438532, 42, -30.375), (0, -1, 0)), revolution_arc=35.816080749, mode=Mode.SUBTRACT)
    with BuildSketch(Plane(origin=(195.830561468, 42, -30.375), x_dir=(0, 0, -1), z_dir=(-1, 0, 0))) as fillet19_2_piece_6:
        with BuildLine():
            CenterArc((3 + FILLET19_R, FILLET19_R), FILLET19_R, 180, 90)
            Line((3, FILLET19_R), (3, 0))
            Line((3, 0), (3 + FILLET19_R, 0))
        make_face()
    revolve(axis=Axis((195.830561468, 42, -30.375), (0, -1, 0)), revolution_arc=35.816080749, mode=Mode.SUBTRACT)
    with BuildSketch(Plane(origin=(187.769438532, 42, -14.625), x_dir=(-0.5851852867542673, 0, 0.8108996116451938), z_dir=(-0.8108996116451938, 0, -0.5851852867542673))) as fillet19_2_piece_7:
        with BuildLine():
            CenterArc((3 + FILLET19_R, -FILLET19_R), FILLET19_R, 90, 90)
            Line((3, -FILLET19_R), (3, 0))
            Line((3, 0), (3 + FILLET19_R, 0))
        make_face()
    revolve(axis=Axis((187.769438532, 42, -14.625), (0, 1, 0)), revolution_arc=35.816080749, mode=Mode.SUBTRACT)
    with BuildSketch(Plane(origin=(195.830561468, 42, -14.625), x_dir=(0, 0, 1), z_dir=(-1, 0, 0))) as fillet19_2_piece_8:
        with BuildLine():
            CenterArc((3 + FILLET19_R, -FILLET19_R), FILLET19_R, 90, 90)
            Line((3, -FILLET19_R), (3, 0))
            Line((3, 0), (3 + FILLET19_R, 0))
        make_face()
    revolve(axis=Axis((195.830561468, 42, -14.625), (0, 1, 0)), revolution_arc=35.816080749, mode=Mode.SUBTRACT)

    # Sketch79 → Cut-Extrude65 (cut)
    with BuildSketch(Plane(origin=(0, 35.825, 0), x_dir=(1, 0, 0), z_dir=(0, 1, 0))):
        Polygon((182.642857143, 30.375), (177.1, 26.375), (177.1, 18.625), (182.642857143, 14.625), (200.957142857, 14.625), (206.5, 18.625), (206.5, 26.375), (200.957142857, 30.375), align=None)
    extrude(amount=-CUT_EXTRUDE65_DEPTH, mode=Mode.SUBTRACT)

    # Chamfer1
    # the kernel refuses this chamfer: 10 mm, written as the material it takes off along each edge
    with BuildSketch(Plane(origin=(168.431697314, 35.825, -30.375), x_dir=(0, 0.5127284623875434, -0.8585508277660127), z_dir=(1, 0, 0))) as chamfer1_piece_1_section:
        with BuildLine():
            Line((2.846151297, 0), (-3.030407819, -4.809340769))
            Line((-3.030407819, -4.809340769), (-3.202117985, -4.706795077))
            ThreePointArc((-3.202117985, -4.706795077), (-1.628587032, -2.336957732), (-0.171710166, 0.102545692))
            Line((-0.171710166, 0.102545692), (0.102545692, 0.171710166))
            ThreePointArc((0.102545692, 0.171710166), (1.413174006, -0.221555438), (2.779590285, 0.188599129))
            Line((2.779590285, 0.188599129), (2.846151297, 0))
        make_face()
    chamfer1_piece_1 = extrude(amount=46.736605371, mode=Mode.PRIVATE)
    chamfer1_piece_1 = split(chamfer1_piece_1, bisect_by=Plane(origin=(188.974245231, 34.450110824, -34.94404295), z_dir=(0.5851852867542668, 0, 0.8108996116451941)), keep=Keep.TOP, mode=Mode.PRIVATE)
    chamfer1_piece_1 = split(chamfer1_piece_1, bisect_by=Plane(origin=(194.625754769, 34.450110824, -34.94404295), z_dir=(-0.585185286754268, 0, 0.8108996116451932)), keep=Keep.TOP, mode=Mode.PRIVATE)
    chamfer1_piece_1 = split(chamfer1_piece_1, bisect_by=Plane(origin=(191.8, 31.825, -31.028354199), z_dir=(0, 1, 0)), keep=Keep.TOP, mode=Mode.PRIVATE)
    add(chamfer1_piece_1, mode=Mode.SUBTRACT)
    with BuildSketch(Plane(origin=(131.031697314, 35.825, -30.375), x_dir=(0, 0.5127284623875334, -0.8585508277660184), z_dir=(1, 0, 0))) as chamfer1_piece_2_section:
        with BuildLine():
            Line((2.846151297, 0), (-3.030407819, -4.809340769))
            Line((-3.030407819, -4.809340769), (-3.202117985, -4.706795077))
            ThreePointArc((-3.202117985, -4.706795077), (-1.628587032, -2.336957732), (-0.171710166, 0.102545692))
            Line((-0.171710166, 0.102545692), (0.102545692, 0.171710166))
            ThreePointArc((0.102545692, 0.171710166), (1.413174006, -0.221555438), (2.779590285, 0.188599129))
            Line((2.779590285, 0.188599129), (2.846151297, 0))
        make_face()
    chamfer1_piece_2 = extrude(amount=46.736605371, mode=Mode.PRIVATE)
    chamfer1_piece_2 = split(chamfer1_piece_2, bisect_by=Plane(origin=(157.225754769, 34.450110824, -34.94404295), z_dir=(-0.5851852867542653, 0, 0.8108996116451952)), keep=Keep.TOP, mode=Mode.PRIVATE)
    chamfer1_piece_2 = split(chamfer1_piece_2, bisect_by=Plane(origin=(151.574245231, 34.450110824, -34.94404295), z_dir=(0.5851852867542653, 0, 0.8108996116451952)), keep=Keep.TOP, mode=Mode.PRIVATE)
    chamfer1_piece_2 = split(chamfer1_piece_2, bisect_by=Plane(origin=(154.4, 31.825, -31.028354199), z_dir=(0, 1, 0)), keep=Keep.TOP, mode=Mode.PRIVATE)
    add(chamfer1_piece_2, mode=Mode.SUBTRACT)

    # Chamfer2
    # the kernel refuses this chamfer: 10 mm, written as the material it takes off along each edge
    with BuildSketch(Plane(origin=(168.431697314, 35.825, -14.625), x_dir=(0, 0.5127284623875406, 0.8585508277660144), z_dir=(1, 0, 0))) as chamfer2_piece_1_section:
        with BuildLine():
            Line((2.846151297, 0), (-3.030407819, 4.809340769))
            Line((-3.030407819, 4.809340769), (-3.202117985, 4.706795077))
            ThreePointArc((-3.202117985, 4.706795077), (-1.628587032, 2.336957732), (-0.171710166, -0.102545692))
            Line((-0.171710166, -0.102545692), (0.102545692, -0.171710166))
            ThreePointArc((0.102545692, -0.171710166), (1.413174006, 0.221555438), (2.779590285, -0.188599129))
            Line((2.779590285, -0.188599129), (2.846151297, 0))
        make_face()
    chamfer2_piece_1 = extrude(amount=46.736605371, mode=Mode.PRIVATE)
    chamfer2_piece_1 = split(chamfer2_piece_1, bisect_by=Plane(origin=(191.8, 31.825, -13.971645801), z_dir=(0, 1, 0)), keep=Keep.TOP, mode=Mode.PRIVATE)
    chamfer2_piece_1 = split(chamfer2_piece_1, bisect_by=Plane(origin=(188.974245231, 34.450110824, -10.05595705), z_dir=(0.5851852867542655, 0, -0.8108996116451951)), keep=Keep.TOP, mode=Mode.PRIVATE)
    chamfer2_piece_1 = split(chamfer2_piece_1, bisect_by=Plane(origin=(194.625754769, 34.450110824, -10.05595705), z_dir=(-0.5851852867542667, 0, -0.8108996116451941)), keep=Keep.TOP, mode=Mode.PRIVATE)
    add(chamfer2_piece_1, mode=Mode.SUBTRACT)
    with BuildSketch(Plane(origin=(131.031697314, 35.825, -14.625), x_dir=(0, 0.512728462387533, 0.8585508277660189), z_dir=(1, 0, 0))) as chamfer2_piece_2_section:
        with BuildLine():
            Line((2.846151297, 0), (-3.030407819, 4.809340769))
            Line((-3.030407819, 4.809340769), (-3.202117985, 4.706795077))
            ThreePointArc((-3.202117985, 4.706795077), (-1.628587032, 2.336957732), (-0.171710166, -0.102545692))
            Line((-0.171710166, -0.102545692), (0.102545692, -0.171710166))
            ThreePointArc((0.102545692, -0.171710166), (1.413174006, 0.221555438), (2.779590285, -0.188599129))
            Line((2.779590285, -0.188599129), (2.846151297, 0))
        make_face()
    chamfer2_piece_2 = extrude(amount=46.736605371, mode=Mode.PRIVATE)
    chamfer2_piece_2 = split(chamfer2_piece_2, bisect_by=Plane(origin=(151.574245231, 34.450110824, -10.05595705), z_dir=(0.5851852867542657, 0, -0.810899611645195)), keep=Keep.TOP, mode=Mode.PRIVATE)
    chamfer2_piece_2 = split(chamfer2_piece_2, bisect_by=Plane(origin=(157.225754769, 34.450110824, -10.05595705), z_dir=(-0.5851852867542657, 0, -0.810899611645195)), keep=Keep.TOP, mode=Mode.PRIVATE)
    chamfer2_piece_2 = split(chamfer2_piece_2, bisect_by=Plane(origin=(154.4, 31.825, -13.971645801), z_dir=(0, 1, 0)), keep=Keep.TOP, mode=Mode.PRIVATE)
    add(chamfer2_piece_2, mode=Mode.SUBTRACT)

    # Sketch72 → Cut-Extrude61 (cut, two sides: drawn at the far end of the back side and taken through both)
    with BuildSketch(Plane.ZY.offset(-9).offset(-CUT_EXTRUDE61_DEPTH_BACK)):
        with Locations((-22.5, 12.5)):
            Rectangle(SKETCH72_W, SKETCH72_H)
    extrude(amount=CUT_EXTRUDE61_DEPTH + CUT_EXTRUDE61_DEPTH_BACK, mode=Mode.SUBTRACT)

    # Sketch74 → Cut-Extrude62 (cut, through all)
    with BuildSketch(Plane.XZ.offset(-30)):
        with Locations((68.1, -22.5)):
            Rectangle(SKETCH74_W, SKETCH74_H)
    extrude(amount=-CUT_EXTRUDE62_DEPTH, mode=Mode.SUBTRACT)

    # Sketch81 → Cut-Extrude66 (cut)
    with BuildSketch(Plane(origin=(0, 42, 0), x_dir=(1, 0, 0), z_dir=(0, 1, 0))):
        with Locations((195.3, 22.5)):
            Rectangle(SKETCH81_W, SKETCH81_H)
    extrude(amount=-CUT_EXTRUDE66_DEPTH, mode=Mode.SUBTRACT)


solid = part.part
